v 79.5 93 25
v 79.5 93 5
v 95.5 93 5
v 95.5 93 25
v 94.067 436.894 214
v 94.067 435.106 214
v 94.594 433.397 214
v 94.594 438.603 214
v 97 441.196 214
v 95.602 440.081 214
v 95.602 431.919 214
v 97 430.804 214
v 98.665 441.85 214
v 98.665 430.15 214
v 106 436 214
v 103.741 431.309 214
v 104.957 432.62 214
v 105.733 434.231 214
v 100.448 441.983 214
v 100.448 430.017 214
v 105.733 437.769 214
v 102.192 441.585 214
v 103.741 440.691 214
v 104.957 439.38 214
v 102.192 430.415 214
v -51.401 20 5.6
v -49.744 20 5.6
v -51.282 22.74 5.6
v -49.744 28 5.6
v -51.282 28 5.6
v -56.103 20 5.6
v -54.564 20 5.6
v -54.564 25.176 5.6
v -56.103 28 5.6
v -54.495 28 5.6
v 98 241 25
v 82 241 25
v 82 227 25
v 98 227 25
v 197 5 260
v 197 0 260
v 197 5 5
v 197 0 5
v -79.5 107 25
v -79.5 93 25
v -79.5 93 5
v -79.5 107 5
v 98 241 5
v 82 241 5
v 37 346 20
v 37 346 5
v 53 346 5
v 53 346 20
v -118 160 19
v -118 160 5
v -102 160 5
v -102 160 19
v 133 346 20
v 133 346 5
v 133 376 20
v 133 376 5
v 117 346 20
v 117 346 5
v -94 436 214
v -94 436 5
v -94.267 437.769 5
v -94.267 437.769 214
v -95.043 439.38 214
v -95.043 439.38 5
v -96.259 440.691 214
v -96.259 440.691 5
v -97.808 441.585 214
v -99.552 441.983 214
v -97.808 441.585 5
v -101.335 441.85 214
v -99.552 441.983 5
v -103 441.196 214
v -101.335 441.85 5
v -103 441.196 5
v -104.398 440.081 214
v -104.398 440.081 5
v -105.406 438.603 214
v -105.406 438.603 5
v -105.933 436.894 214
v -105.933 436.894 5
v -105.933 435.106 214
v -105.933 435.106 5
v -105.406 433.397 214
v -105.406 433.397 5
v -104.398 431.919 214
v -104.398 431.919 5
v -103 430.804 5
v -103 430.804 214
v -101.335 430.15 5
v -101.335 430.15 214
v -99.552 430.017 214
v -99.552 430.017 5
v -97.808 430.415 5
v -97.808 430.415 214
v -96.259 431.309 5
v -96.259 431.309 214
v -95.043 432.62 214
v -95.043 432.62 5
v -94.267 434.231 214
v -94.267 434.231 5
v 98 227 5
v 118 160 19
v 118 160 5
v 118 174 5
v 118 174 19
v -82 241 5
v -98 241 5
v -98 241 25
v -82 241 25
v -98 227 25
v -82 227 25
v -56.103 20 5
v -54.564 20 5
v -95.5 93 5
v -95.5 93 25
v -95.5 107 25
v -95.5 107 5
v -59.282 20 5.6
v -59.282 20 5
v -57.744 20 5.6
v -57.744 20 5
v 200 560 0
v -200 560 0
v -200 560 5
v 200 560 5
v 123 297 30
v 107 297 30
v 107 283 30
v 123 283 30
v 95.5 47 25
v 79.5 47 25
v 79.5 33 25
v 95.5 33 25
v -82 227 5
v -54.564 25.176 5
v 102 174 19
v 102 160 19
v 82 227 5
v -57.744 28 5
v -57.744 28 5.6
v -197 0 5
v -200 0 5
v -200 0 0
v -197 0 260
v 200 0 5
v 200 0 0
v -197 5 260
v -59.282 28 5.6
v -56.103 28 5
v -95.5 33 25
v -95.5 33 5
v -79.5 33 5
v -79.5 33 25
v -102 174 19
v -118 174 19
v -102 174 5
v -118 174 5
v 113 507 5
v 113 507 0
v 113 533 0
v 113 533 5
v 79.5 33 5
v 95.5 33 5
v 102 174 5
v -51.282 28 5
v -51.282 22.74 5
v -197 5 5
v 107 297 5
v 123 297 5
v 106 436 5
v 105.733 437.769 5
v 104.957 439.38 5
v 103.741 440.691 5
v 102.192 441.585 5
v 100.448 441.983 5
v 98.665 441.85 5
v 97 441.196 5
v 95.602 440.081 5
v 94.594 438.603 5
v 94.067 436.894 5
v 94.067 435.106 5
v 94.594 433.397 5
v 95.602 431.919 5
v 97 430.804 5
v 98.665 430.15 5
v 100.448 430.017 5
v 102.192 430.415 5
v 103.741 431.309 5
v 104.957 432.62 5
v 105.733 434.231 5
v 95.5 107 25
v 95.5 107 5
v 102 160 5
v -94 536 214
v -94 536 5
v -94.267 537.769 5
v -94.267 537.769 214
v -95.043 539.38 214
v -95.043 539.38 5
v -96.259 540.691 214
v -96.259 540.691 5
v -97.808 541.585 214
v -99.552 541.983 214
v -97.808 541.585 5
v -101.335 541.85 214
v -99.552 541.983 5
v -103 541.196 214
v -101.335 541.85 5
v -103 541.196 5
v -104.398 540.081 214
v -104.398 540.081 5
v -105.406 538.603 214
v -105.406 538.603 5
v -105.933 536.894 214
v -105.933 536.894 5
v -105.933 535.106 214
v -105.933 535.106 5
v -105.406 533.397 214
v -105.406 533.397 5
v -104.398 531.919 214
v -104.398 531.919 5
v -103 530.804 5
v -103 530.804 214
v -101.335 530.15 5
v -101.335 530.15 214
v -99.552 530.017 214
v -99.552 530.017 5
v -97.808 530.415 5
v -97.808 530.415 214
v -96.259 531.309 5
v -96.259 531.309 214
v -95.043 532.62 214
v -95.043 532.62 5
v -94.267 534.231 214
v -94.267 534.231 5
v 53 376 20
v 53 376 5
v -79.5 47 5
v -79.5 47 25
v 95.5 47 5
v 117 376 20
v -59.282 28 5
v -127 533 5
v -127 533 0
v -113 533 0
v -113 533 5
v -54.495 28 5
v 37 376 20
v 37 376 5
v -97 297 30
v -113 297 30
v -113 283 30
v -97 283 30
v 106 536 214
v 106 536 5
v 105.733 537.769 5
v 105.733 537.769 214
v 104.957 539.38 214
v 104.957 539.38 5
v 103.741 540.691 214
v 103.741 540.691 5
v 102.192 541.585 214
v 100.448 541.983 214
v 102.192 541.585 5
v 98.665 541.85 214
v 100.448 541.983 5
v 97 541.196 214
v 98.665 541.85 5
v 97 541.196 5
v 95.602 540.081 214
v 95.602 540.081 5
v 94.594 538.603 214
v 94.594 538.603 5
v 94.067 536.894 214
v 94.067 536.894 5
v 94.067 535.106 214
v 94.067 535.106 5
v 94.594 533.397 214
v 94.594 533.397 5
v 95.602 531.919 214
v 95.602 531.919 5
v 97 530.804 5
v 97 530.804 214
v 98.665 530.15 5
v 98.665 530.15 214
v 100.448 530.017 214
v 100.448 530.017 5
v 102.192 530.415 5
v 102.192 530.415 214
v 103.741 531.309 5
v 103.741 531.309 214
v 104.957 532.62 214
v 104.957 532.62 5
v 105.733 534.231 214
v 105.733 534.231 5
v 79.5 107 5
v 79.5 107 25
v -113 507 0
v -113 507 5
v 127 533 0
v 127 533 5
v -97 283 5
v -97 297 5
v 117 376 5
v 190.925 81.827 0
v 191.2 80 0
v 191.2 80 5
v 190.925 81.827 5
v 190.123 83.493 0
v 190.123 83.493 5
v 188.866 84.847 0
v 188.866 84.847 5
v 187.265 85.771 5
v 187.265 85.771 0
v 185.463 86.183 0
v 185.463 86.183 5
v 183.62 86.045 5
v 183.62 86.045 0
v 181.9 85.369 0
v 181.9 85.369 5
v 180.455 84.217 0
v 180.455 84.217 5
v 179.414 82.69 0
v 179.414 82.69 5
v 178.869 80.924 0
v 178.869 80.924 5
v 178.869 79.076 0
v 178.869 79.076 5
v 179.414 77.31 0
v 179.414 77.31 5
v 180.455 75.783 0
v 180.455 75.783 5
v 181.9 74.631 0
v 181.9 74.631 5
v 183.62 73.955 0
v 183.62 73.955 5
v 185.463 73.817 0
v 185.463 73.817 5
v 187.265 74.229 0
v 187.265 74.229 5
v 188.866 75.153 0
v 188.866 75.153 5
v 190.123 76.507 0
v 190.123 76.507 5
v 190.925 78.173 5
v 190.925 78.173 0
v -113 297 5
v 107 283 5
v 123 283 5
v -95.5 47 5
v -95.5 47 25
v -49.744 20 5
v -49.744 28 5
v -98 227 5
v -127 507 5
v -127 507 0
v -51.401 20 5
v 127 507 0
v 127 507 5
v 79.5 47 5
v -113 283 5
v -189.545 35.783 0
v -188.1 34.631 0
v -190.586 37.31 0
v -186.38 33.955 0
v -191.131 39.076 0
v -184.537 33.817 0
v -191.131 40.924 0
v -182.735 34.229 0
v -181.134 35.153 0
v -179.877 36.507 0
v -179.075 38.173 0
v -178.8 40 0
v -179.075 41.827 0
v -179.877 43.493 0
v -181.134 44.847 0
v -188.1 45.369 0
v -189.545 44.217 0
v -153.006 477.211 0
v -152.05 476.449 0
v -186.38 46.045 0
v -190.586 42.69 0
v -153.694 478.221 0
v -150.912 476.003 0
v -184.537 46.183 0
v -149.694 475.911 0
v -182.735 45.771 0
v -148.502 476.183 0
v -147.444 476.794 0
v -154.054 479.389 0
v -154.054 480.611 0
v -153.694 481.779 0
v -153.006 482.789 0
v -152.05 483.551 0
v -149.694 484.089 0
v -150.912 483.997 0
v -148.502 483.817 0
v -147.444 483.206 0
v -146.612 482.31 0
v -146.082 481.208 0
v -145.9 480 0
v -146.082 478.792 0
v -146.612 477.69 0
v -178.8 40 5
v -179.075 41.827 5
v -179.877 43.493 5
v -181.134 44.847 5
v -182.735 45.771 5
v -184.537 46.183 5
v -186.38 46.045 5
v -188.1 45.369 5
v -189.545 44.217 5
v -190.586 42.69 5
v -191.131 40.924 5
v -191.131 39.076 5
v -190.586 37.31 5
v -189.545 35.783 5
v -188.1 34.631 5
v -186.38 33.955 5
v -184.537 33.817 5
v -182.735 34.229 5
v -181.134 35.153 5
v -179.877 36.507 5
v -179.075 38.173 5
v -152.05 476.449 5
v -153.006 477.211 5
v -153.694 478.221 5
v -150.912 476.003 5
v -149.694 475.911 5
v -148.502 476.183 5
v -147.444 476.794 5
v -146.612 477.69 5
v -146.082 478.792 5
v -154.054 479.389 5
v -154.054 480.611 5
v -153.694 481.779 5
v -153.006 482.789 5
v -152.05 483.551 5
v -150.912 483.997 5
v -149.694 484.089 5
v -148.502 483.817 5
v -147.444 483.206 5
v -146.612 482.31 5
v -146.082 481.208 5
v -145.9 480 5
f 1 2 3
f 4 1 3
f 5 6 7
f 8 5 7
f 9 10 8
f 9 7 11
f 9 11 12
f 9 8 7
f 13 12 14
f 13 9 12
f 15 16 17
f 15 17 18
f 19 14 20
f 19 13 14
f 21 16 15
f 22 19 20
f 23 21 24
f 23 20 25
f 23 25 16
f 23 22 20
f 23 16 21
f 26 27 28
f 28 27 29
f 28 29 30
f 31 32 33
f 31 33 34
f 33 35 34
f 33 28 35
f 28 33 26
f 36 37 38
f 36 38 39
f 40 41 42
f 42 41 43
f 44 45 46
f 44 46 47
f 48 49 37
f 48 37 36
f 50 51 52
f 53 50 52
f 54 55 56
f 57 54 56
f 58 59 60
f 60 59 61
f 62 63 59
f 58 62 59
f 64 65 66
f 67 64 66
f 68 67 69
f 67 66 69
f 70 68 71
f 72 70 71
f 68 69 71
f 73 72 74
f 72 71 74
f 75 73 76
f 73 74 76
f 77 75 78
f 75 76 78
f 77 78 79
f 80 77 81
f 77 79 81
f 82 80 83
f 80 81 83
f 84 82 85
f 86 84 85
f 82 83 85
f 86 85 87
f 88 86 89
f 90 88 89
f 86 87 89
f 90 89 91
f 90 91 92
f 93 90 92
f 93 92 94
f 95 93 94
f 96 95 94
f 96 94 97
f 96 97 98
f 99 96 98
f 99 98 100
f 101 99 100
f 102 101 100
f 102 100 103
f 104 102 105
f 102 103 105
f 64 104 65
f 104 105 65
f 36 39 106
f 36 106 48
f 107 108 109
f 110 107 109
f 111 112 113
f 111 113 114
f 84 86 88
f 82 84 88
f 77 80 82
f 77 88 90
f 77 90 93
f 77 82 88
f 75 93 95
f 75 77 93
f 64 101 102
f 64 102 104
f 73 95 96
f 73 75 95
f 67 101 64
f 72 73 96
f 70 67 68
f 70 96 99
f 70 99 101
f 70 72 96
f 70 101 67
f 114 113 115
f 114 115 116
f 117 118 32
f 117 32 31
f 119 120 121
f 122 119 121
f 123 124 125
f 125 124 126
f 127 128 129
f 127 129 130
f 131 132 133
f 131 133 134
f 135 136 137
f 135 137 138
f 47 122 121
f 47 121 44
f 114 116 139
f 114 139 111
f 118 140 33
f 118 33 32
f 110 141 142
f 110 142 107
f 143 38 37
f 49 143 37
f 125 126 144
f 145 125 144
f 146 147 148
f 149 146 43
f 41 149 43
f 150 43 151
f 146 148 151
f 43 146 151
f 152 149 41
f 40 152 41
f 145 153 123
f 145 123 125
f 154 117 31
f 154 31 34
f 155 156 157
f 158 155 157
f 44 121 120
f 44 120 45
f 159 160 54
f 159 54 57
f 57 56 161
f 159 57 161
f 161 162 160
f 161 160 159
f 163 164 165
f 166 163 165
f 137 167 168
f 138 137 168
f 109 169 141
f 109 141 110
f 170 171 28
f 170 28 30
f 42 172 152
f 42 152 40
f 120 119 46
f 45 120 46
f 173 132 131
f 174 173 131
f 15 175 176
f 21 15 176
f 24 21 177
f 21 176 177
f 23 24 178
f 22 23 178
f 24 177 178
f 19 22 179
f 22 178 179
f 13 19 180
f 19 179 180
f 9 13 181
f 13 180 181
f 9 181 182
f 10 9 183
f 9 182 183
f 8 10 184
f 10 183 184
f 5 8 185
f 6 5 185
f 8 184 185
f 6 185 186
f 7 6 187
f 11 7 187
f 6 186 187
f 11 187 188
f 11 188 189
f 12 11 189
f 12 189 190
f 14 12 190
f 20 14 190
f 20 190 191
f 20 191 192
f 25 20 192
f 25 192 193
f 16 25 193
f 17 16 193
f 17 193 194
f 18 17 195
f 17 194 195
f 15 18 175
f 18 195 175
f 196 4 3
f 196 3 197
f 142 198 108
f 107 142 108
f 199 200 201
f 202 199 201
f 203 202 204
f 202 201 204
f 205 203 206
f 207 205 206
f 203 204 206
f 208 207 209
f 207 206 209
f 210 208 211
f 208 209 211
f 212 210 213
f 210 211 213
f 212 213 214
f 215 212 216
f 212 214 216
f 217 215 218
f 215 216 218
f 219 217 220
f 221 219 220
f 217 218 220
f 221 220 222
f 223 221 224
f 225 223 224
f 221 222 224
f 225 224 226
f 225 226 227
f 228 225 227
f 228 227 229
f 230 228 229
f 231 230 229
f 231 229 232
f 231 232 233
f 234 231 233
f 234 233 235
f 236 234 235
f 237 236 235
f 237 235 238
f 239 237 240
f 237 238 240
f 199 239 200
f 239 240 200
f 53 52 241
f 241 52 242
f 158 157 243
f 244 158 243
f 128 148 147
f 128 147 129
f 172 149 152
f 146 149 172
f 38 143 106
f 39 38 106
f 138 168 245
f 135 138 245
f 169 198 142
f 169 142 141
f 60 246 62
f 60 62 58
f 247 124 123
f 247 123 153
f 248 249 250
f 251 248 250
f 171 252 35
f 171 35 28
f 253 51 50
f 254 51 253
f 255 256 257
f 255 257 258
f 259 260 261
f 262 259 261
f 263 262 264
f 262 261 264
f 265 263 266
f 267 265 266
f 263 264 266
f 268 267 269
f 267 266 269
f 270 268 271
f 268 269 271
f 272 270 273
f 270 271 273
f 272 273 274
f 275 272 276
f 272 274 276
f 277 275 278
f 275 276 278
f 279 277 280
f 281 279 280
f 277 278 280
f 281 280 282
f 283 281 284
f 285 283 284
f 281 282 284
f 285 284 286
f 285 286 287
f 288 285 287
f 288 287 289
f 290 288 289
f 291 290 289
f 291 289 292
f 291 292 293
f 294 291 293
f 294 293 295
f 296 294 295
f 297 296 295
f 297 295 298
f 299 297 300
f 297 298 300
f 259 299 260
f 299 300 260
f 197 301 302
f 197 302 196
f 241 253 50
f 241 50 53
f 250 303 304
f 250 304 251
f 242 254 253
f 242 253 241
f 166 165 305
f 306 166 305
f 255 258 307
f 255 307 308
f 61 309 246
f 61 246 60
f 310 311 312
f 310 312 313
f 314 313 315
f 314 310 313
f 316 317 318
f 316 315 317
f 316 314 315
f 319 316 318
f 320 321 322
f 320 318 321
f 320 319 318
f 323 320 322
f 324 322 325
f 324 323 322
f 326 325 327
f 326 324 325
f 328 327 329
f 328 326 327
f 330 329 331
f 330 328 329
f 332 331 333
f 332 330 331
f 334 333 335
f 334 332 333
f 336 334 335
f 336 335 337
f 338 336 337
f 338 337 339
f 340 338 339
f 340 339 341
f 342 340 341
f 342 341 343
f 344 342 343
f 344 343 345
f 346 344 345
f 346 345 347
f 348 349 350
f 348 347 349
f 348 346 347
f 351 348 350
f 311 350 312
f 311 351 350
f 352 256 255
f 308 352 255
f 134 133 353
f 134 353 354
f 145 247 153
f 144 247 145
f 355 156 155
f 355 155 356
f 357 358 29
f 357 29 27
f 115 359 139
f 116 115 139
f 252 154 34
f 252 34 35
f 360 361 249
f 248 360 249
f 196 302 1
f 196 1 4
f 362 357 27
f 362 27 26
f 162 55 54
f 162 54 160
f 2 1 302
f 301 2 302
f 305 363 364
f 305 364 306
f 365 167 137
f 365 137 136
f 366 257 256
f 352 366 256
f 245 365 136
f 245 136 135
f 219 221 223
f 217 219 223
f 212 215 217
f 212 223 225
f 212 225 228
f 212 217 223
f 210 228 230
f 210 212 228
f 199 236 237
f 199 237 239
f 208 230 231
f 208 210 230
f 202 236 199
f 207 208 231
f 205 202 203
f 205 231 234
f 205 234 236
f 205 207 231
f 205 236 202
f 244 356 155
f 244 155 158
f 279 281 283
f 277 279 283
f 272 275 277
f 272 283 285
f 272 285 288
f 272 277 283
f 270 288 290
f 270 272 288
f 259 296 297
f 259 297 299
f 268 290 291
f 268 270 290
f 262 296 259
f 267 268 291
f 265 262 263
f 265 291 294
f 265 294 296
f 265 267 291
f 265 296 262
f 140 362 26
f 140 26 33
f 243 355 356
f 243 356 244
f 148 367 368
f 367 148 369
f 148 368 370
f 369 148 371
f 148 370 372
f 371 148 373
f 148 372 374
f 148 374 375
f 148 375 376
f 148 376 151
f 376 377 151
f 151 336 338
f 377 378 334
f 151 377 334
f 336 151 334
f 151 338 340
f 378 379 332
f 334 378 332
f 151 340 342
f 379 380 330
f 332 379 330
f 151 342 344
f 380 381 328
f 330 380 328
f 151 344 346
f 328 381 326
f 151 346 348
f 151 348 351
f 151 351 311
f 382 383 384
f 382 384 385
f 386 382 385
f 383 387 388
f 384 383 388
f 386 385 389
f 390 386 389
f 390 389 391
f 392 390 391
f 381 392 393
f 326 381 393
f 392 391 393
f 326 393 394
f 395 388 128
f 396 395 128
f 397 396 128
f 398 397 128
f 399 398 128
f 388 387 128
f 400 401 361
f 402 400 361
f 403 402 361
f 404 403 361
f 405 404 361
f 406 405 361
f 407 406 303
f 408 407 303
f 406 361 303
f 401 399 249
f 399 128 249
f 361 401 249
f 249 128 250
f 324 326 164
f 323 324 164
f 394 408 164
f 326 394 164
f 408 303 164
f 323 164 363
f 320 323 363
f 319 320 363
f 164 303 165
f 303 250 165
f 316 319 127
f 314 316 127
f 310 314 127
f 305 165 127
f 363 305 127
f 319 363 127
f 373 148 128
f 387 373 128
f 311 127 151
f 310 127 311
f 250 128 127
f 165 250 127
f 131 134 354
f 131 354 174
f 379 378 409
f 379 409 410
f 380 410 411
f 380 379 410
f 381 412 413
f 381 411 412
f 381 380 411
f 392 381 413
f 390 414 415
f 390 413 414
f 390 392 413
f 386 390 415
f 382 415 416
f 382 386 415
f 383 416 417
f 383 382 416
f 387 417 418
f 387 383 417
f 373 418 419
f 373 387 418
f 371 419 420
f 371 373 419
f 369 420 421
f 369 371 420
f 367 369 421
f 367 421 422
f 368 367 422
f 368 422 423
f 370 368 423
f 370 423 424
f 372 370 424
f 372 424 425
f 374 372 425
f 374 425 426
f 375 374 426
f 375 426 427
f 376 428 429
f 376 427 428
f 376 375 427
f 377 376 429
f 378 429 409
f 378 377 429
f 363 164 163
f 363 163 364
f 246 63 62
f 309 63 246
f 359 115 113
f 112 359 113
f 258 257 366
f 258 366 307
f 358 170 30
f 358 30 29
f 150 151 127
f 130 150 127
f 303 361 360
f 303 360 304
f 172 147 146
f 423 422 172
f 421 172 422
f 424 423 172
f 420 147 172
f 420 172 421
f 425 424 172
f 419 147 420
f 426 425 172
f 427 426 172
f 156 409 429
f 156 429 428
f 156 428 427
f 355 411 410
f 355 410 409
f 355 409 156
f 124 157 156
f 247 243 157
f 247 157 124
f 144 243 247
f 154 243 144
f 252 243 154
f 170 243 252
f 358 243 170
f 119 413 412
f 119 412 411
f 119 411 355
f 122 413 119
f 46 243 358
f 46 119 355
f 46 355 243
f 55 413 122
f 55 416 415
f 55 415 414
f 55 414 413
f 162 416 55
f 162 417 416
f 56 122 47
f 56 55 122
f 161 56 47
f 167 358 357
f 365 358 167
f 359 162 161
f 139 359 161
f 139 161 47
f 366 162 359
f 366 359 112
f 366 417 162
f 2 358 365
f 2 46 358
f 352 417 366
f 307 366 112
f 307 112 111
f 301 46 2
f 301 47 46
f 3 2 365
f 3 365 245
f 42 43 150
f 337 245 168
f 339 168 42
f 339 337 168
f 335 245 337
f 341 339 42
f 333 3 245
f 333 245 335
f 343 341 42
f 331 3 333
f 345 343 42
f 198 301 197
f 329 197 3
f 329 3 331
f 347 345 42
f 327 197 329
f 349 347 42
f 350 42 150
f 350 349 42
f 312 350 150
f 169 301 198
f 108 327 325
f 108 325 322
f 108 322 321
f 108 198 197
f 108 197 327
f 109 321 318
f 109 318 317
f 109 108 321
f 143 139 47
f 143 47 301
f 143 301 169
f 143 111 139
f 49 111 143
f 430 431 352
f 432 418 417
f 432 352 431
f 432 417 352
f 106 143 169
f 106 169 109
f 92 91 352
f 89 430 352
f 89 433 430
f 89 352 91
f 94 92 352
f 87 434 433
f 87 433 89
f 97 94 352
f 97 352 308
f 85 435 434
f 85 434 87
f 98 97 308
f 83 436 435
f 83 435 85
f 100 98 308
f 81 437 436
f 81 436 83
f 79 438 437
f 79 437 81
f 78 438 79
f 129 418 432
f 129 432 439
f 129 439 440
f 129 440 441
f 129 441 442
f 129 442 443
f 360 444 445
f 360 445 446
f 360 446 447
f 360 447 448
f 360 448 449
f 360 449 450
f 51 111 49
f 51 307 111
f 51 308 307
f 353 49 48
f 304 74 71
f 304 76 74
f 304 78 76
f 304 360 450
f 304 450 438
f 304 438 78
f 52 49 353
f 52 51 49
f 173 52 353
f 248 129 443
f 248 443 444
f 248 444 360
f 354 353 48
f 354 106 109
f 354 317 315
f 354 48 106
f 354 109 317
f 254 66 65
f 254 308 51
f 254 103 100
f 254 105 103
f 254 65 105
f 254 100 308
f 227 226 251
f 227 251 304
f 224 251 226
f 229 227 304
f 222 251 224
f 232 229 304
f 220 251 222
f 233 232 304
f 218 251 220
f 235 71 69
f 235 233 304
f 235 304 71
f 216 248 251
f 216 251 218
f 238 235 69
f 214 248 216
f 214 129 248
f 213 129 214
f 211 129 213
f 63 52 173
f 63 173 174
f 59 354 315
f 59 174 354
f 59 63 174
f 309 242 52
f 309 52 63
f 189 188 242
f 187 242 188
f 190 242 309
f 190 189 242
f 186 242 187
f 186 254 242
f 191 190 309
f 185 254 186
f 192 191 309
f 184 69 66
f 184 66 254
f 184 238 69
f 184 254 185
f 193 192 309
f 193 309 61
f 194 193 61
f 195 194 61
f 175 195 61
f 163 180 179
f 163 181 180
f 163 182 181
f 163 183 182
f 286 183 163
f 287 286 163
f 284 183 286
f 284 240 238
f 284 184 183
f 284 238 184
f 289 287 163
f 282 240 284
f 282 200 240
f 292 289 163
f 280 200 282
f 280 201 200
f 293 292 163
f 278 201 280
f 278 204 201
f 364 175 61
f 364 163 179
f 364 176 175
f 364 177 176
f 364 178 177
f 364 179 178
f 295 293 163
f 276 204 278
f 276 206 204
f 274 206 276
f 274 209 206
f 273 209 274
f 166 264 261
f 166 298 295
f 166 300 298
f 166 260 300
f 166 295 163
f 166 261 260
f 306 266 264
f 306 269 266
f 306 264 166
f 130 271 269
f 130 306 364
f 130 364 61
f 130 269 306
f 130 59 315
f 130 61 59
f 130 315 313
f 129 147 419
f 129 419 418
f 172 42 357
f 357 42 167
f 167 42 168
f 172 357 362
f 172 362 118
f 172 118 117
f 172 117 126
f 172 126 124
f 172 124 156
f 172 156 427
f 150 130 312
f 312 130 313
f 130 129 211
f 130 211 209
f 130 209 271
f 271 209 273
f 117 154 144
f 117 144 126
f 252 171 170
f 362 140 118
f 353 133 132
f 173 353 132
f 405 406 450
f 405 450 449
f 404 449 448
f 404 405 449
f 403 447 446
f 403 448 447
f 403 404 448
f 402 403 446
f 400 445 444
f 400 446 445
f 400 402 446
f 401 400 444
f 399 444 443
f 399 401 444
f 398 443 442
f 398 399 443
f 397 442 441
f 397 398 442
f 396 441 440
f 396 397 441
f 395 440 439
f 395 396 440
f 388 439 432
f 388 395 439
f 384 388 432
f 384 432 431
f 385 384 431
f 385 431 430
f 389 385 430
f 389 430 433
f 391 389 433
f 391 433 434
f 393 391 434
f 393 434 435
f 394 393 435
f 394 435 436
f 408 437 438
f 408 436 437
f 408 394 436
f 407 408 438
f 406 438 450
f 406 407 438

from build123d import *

# Parameters (mm, degrees)
SKETCH1_W                  = 400
SKETCH1_H                  = 560
PANEL_DEPTH                = 5
SKETCH2_W                  = 394
SKETCH2_H                  = 255
SHELF_DEPTH                = 5
WALL_KEYHOLES_DEPTH        = 649.999229584
WALL_KEYHOLES_DEPTH_BACK   = 649.999229584
SKETCH3_W                  = 14
SKETCH3_H                  = 26
CONNECTOR_HOLES_DEPTH      = 649.999229584
CONNECTOR_HOLES_DEPTH_BACK = 649.999229584
SKETCH4_R                  = 6.2
SKETCH4_R_2                = 4.1
MODULE_POSTS_START         = 5
SKETCH5_R                  = 6
MODULE_POSTS_DEPTH         = 209
SADDLES_SED_START          = 5
SKETCH6_W                  = 16
SKETCH6_H                  = 14
SADDLES_SED_DEPTH          = 20
SADDLES_CARB_START         = 5
SKETCH7_W                  = 16
SKETCH7_H                  = 14
SADDLES_CARB_DEPTH         = 20
SADDLES_RO_START           = 5
SKETCH8_W                  = 16
SKETCH8_H                  = 14
SADDLES_RO_DEPTH           = 14
SADDLES_UF_START           = 5
SKETCH9_W                  = 16
SKETCH9_H                  = 14
SADDLES_UF_DEPTH           = 20
SADDLES_UVC_START          = 5
SKETCH10_W                 = 16
SKETCH10_H                 = 14
SADDLES_UVC_DEPTH          = 25
PUMP_MOUNT_POSTS_START     = 5
SKETCH11_W                 = 16
SKETCH11_H                 = 30
PUMP_MOUNT_POSTS_DEPTH     = 15
LABEL_IN_START             = 5
SKETCH12_W                 = 1.538461538
SKETCH12_H                 = 8
LABEL_IN_DEPTH             = 0.6


with BuildPart() as part:
    # Sketch1 → Panel (new body)
    with BuildSketch(Plane.XY):
        with Locations((0, 280)):
            Rectangle(SKETCH1_W, SKETCH1_H)
    extrude(amount=PANEL_DEPTH)

    # Sketch2 → Shelf (add)
    with BuildSketch(Plane(origin=(0, 0, 0), x_dir=(1, 0, 0), z_dir=(0, 1, 0))):
        with Locations((0, -132.5)):
            Rectangle(SKETCH2_W, SKETCH2_H)
    extrude(amount=SHELF_DEPTH)

    # Sketch3 → Wall_Keyholes (cut, two sides: drawn at the far end of the back side and taken through both)
    with BuildSketch(Plane.XY.offset(-WALL_KEYHOLES_DEPTH_BACK)):
        with Locations((-120, 520)):
            Rectangle(SKETCH3_W, SKETCH3_H)
        with Locations((120, 520)):
            Rectangle(SKETCH3_W, SKETCH3_H)
    extrude(amount=WALL_KEYHOLES_DEPTH + WALL_KEYHOLES_DEPTH_BACK, mode=Mode.SUBTRACT)

    # Sketch4 → Connector_Holes (cut, two sides: drawn at the far end of the back side and taken through both)
    with BuildSketch(Plane.XY.offset(-CONNECTOR_HOLES_DEPTH_BACK)):
        with Locations((-185, 40)):
            Circle(SKETCH4_R)
        with Locations((185, 80)):
            Circle(SKETCH4_R)
        with Locations((-150, 480)):
            Circle(SKETCH4_R_2)
    extrude(amount=CONNECTOR_HOLES_DEPTH + CONNECTOR_HOLES_DEPTH_BACK, mode=Mode.SUBTRACT)

    # Sketch5 → Module_Posts (add)
    with BuildSketch(Plane.XY.offset(MODULE_POSTS_START)):
        with Locations((-100, 436)):
            Circle(SKETCH5_R)
        with Locations((-100, 536)):
            Circle(SKETCH5_R)
        with Locations((100, 436)):
            Circle(SKETCH5_R)
        with Locations((100, 536)):
            Circle(SKETCH5_R)
    extrude(amount=MODULE_POSTS_DEPTH)

    # Sketch6 → Saddles_SED (add)
    with BuildSketch(Plane.XY.offset(SADDLES_SED_START)):
        with Locations((-87.5, 40)):
            Rectangle(SKETCH6_W, SKETCH6_H)
        with Locations((87.5, 40)):
            Rectangle(SKETCH6_W, SKETCH6_H)
    extrude(amount=SADDLES_SED_DEPTH)

    # Sketch7 → Saddles_CARB (add)
    with BuildSketch(Plane.XY.offset(SADDLES_CARB_START)):
        with Locations((-87.5, 100)):
            Rectangle(SKETCH7_W, SKETCH7_H)
        with Locations((87.5, 100)):
            Rectangle(SKETCH7_W, SKETCH7_H)
    extrude(amount=SADDLES_CARB_DEPTH)

    # Sketch8 → Saddles_RO (add)
    with BuildSketch(Plane.XY.offset(SADDLES_RO_START)):
        with Locations((-110, 167)):
            Rectangle(SKETCH8_W, SKETCH8_H)
        with Locations((110, 167)):
            Rectangle(SKETCH8_W, SKETCH8_H)
    extrude(amount=SADDLES_RO_DEPTH)

    # Sketch9 → Saddles_UF (add)
    with BuildSketch(Plane.XY.offset(SADDLES_UF_START)):
        with Locations((-90, 234)):
            Rectangle(SKETCH9_W, SKETCH9_H)
        with Locations((90, 234)):
            Rectangle(SKETCH9_W, SKETCH9_H)
    extrude(amount=SADDLES_UF_DEPTH)

    # Sketch10 → Saddles_UVC (add)
    with BuildSketch(Plane.XY.offset(SADDLES_UVC_START)):
        with Locations((-105, 290)):
            Rectangle(SKETCH10_W, SKETCH10_H)
        with Locations((115, 290)):
            Rectangle(SKETCH10_W, SKETCH10_H)
    extrude(amount=SADDLES_UVC_DEPTH)

    # Sketch11 → Pump_Mount_Posts (add)
    with BuildSketch(Plane.XY.offset(PUMP_MOUNT_POSTS_START)):
        with Locations((45, 361)):
            Rectangle(SKETCH11_W, SKETCH11_H)
        with Locations((125, 361)):
            Rectangle(SKETCH11_W, SKETCH11_H)
    extrude(amount=PUMP_MOUNT_POSTS_DEPTH)

    # Sketch12 → Label_IN (add)
    with BuildSketch(Plane.XY.offset(LABEL_IN_START)):
        with Locations((-58.512820513, 24)):
            Rectangle(SKETCH12_W, SKETCH12_H)
        Polygon((-56.102564103, 20), (-56.102564103, 28), (-54.495192308, 28), (-51.282051282, 22.740384615), (-51.282051282, 28), (-49.743589744, 28), (-49.743589744, 20), (-51.400641026, 20), (-54.564102564, 25.176282051), (-54.564102564, 20), align=None)
    extrude(amount=LABEL_IN_DEPTH)


solid = part.part
